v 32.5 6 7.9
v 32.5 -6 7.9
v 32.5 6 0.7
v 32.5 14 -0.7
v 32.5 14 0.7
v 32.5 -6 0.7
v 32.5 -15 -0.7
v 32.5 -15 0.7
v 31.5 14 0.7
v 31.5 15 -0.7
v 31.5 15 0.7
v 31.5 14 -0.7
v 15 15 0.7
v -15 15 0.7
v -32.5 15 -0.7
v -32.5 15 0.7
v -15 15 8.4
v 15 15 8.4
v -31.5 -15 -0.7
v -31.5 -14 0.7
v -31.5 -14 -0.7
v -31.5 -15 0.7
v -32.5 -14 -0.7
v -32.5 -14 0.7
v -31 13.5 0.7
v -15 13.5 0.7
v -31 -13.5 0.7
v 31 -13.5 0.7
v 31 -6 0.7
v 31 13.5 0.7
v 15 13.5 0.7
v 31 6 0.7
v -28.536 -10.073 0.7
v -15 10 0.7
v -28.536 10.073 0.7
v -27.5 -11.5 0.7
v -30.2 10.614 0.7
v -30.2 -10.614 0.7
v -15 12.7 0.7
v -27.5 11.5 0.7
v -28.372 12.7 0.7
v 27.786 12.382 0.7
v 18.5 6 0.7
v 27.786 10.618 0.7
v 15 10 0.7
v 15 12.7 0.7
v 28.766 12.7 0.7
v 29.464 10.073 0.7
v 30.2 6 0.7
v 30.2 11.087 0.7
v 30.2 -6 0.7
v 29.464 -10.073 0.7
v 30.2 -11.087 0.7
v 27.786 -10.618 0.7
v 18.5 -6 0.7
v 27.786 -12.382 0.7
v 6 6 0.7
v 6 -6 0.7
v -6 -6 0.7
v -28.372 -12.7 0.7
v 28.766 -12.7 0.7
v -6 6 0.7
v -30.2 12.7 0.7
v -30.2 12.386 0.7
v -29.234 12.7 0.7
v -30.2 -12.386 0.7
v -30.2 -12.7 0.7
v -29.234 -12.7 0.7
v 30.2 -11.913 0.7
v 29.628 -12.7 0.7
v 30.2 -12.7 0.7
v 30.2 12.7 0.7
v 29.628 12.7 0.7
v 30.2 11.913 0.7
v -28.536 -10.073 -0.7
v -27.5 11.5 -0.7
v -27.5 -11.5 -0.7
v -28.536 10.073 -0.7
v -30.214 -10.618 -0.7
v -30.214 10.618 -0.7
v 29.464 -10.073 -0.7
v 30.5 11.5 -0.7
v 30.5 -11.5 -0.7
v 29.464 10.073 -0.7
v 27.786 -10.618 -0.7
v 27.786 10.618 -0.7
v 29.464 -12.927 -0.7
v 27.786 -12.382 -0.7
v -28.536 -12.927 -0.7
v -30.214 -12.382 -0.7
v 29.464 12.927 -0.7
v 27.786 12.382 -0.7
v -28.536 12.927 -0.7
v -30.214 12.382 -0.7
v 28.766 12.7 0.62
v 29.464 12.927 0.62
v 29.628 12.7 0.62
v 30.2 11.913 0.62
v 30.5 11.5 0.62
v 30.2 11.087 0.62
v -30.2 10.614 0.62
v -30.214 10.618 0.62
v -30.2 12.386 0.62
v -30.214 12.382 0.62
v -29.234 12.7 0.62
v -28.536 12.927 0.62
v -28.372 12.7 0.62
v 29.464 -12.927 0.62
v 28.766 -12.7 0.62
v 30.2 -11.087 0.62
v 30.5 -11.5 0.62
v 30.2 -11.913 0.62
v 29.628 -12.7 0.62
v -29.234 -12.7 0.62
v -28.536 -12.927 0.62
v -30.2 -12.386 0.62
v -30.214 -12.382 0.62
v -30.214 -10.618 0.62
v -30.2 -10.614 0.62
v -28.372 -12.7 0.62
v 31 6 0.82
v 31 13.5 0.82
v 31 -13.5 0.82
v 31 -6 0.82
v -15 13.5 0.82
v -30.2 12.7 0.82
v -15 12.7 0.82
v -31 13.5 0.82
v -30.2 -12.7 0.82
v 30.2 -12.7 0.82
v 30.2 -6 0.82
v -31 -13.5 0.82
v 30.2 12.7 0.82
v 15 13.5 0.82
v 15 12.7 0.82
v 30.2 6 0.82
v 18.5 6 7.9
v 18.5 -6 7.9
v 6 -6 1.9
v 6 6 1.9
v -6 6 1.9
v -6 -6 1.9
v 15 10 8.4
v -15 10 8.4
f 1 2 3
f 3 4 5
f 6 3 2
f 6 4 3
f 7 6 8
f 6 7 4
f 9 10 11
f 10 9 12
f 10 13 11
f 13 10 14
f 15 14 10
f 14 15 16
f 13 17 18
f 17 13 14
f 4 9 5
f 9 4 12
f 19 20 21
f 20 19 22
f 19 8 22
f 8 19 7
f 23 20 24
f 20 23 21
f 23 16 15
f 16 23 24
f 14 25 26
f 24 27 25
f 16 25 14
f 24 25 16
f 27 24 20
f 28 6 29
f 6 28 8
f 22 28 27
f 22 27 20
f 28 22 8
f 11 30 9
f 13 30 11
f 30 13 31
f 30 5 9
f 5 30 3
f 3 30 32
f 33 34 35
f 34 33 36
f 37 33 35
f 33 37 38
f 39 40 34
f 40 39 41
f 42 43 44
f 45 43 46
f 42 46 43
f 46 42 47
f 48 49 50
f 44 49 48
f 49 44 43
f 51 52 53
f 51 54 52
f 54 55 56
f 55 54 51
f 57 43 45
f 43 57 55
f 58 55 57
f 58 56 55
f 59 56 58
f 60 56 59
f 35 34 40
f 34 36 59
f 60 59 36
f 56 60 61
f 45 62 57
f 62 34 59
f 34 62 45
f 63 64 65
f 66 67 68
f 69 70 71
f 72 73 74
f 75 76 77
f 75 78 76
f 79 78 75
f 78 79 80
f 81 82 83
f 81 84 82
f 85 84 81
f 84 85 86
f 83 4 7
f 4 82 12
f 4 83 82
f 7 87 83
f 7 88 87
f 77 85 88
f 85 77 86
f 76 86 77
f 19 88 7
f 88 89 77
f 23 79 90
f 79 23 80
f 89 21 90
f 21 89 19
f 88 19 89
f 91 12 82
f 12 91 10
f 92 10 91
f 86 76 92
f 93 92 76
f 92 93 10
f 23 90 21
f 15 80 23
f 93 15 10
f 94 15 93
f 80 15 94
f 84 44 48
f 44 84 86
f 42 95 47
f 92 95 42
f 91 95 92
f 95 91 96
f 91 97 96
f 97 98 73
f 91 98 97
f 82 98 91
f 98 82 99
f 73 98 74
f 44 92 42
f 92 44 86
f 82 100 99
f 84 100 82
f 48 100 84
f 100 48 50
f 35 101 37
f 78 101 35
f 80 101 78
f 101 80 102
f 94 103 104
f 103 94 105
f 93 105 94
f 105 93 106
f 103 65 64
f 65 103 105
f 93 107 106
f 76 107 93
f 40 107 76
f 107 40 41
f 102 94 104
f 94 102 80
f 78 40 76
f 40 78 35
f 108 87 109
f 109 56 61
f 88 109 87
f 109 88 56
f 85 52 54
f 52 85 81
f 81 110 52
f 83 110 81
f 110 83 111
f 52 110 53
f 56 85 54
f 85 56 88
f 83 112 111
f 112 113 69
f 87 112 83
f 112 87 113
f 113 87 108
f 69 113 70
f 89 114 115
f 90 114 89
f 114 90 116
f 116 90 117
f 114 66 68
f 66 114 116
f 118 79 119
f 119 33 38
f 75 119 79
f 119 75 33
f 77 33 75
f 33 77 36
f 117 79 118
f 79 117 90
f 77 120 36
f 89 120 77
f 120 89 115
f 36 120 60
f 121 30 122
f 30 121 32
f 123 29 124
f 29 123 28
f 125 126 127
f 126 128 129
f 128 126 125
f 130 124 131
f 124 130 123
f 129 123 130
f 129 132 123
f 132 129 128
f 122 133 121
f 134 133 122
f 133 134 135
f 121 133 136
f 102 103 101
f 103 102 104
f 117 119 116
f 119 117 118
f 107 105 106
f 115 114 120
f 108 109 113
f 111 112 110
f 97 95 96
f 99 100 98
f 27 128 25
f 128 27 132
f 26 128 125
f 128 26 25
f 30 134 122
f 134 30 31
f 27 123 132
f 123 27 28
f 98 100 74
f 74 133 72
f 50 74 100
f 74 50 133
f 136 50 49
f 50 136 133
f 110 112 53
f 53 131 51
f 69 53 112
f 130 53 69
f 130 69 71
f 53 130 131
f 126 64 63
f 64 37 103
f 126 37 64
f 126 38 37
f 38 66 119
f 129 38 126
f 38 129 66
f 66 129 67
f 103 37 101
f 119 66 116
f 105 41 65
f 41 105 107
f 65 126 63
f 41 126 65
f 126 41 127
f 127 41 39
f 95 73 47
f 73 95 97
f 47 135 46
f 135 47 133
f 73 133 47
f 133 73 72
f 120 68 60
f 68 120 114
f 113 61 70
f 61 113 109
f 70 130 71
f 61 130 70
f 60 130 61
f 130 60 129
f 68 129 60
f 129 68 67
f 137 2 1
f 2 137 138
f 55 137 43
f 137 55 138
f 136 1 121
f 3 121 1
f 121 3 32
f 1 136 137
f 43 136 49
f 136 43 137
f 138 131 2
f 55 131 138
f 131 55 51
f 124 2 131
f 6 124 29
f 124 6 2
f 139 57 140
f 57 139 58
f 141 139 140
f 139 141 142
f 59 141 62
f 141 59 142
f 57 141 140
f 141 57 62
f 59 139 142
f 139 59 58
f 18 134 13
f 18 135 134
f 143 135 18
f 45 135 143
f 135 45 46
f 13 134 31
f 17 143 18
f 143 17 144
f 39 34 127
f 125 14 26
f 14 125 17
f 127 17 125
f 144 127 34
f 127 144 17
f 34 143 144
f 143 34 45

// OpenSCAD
// Parameters
pcb_length = 65.0; //[32.5:130.0:0.5]
pcb_width = 30.0; //[15.0:60.0:0.5]
pcb_thickness = 1.4; //[0.7:2.8:0.1]
edge_chamfer = 1.0; //[0.5:2.0:0.1]
hole_diameter = 3.0; //[2.0:4.0:0.1]
hole_edge_offset = 3.5; //[2.0:7.0:0.1]
hole_cut_extra = 0.6; //[0.2:2.0:0.1]
silkscreen_thickness = 0.2; //[0.1:0.4:0.05]
silkscreen_margin = 1.5; //[0.5:4.0:0.1]
silkscreen_border_width = 0.8; //[0.4:2.0:0.1]
component_overlap = 0.8; //[0.5:2.0:0.1]
connector_height = 8.0; //[4.0:16.0:0.5]
connector_length = 14.0; //[8.0:28.0:0.5]
connector_width = 12.0; //[6.0:24.0:0.5]
ic_length = 12.0; //[6.0:24.0:0.5]
ic_width = 12.0; //[6.0:24.0:0.5]
ic_height = 2.0; //[1.0:5.0:0.1]
header_length = 30.0; //[10.0:60.0:0.5]
header_width = 5.0; //[3.0:10.0:0.5]
header_height = 8.5; //[4.0:16.0:0.5]

// Main PCB Body
module pcb_main_body() {
  color([0.0, 0.4, 0.2]) // Green PCB
  cube([pcb_length, pcb_width, pcb_thickness], center=true);
}

// Edge Chamfer Cutout
module board_edge_chamfer_cutout_corner() {
  cube([edge_chamfer, edge_chamfer, pcb_thickness + hole_cut_extra], center=true);
}

// Mounting Hole Cutter
module mounting_hole_cutter() {
  cylinder(h=pcb_thickness + hole_cut_extra, r=hole_diameter/2, center=true);
}

// Silkscreen Markings
module silkscreen_outer() {
  color("White")
  cube([pcb_length - 2*silkscreen_margin, pcb_width - 2*silkscreen_margin, silkscreen_thickness], center=true);
}

module silkscreen_inner_cut() {
  cube([pcb_length - 2*(silkscreen_margin + silkscreen_border_width), pcb_width - 2*(silkscreen_margin + silkscreen_border_width), silkscreen_thickness + hole_cut_extra], center=true);
}

// Connectors
module connectors() {
  color("Black")
  cube([connector_length, connector_width, connector_height], center=true);
}

// IC Packages
module ic_packages() {
  color("DimGray")
  cube([ic_length, ic_width, ic_height], center=true);
}

// Pin Headers
module pin_headers() {
  color("Silver")
  cube([header_length, header_width, header_height], center=true);
}

// Assemble the SBC Model
module sbc_complete_model() {
  difference() {
    pcb_main_body();
    // Chamfer corners
    for (angle = [0, 90, 180, 270]) {
      rotate([0, 0, angle])
      translate([pcb_length/2 - edge_chamfer/2, pcb_width/2 - edge_chamfer/2, 0])
      board_edge_chamfer_cutout_corner();
    }
    // Mounting holes
    translate([pcb_length/2 - hole_edge_offset, pcb_width/2 - hole_edge_offset, 0])
    mounting_hole_cutter();
    translate([-pcb_length/2 + hole_edge_offset, pcb_width/2 - hole_edge_offset, 0])
    mounting_hole_cutter();
    translate([pcb_length/2 - hole_edge_offset, -pcb_width/2 + hole_edge_offset, 0])
    mounting_hole_cutter();
    translate([-pcb_length/2 + hole_edge_offset, -pcb_width/2 + hole_edge_offset, 0])
    mounting_hole_cutter();
  }
  
  // Silkscreen
  difference() {
    translate([0, 0, pcb_thickness/2 + silkscreen_thickness/2 - component_overlap/10])
    silkscreen_outer();
    translate([0, 0, pcb_thickness/2 + silkscreen_thickness/2 - component_overlap/10])
    silkscreen_inner_cut();
  }
  
  // Components
  translate([pcb_length/2 - connector_length/2, 0, pcb_thickness/2 + connector_height/2 - component_overlap])
  connectors();
  
  translate([0, 0, pcb_thickness/2 + ic_height/2 - component_overlap])
  ic_packages();
  
  translate([0, pcb_width/2 - header_width/2, pcb_thickness/2 + header_height/2 - component_overlap])
  pin_headers();
}

// Render the complete SBC model
sbc_complete_model();
